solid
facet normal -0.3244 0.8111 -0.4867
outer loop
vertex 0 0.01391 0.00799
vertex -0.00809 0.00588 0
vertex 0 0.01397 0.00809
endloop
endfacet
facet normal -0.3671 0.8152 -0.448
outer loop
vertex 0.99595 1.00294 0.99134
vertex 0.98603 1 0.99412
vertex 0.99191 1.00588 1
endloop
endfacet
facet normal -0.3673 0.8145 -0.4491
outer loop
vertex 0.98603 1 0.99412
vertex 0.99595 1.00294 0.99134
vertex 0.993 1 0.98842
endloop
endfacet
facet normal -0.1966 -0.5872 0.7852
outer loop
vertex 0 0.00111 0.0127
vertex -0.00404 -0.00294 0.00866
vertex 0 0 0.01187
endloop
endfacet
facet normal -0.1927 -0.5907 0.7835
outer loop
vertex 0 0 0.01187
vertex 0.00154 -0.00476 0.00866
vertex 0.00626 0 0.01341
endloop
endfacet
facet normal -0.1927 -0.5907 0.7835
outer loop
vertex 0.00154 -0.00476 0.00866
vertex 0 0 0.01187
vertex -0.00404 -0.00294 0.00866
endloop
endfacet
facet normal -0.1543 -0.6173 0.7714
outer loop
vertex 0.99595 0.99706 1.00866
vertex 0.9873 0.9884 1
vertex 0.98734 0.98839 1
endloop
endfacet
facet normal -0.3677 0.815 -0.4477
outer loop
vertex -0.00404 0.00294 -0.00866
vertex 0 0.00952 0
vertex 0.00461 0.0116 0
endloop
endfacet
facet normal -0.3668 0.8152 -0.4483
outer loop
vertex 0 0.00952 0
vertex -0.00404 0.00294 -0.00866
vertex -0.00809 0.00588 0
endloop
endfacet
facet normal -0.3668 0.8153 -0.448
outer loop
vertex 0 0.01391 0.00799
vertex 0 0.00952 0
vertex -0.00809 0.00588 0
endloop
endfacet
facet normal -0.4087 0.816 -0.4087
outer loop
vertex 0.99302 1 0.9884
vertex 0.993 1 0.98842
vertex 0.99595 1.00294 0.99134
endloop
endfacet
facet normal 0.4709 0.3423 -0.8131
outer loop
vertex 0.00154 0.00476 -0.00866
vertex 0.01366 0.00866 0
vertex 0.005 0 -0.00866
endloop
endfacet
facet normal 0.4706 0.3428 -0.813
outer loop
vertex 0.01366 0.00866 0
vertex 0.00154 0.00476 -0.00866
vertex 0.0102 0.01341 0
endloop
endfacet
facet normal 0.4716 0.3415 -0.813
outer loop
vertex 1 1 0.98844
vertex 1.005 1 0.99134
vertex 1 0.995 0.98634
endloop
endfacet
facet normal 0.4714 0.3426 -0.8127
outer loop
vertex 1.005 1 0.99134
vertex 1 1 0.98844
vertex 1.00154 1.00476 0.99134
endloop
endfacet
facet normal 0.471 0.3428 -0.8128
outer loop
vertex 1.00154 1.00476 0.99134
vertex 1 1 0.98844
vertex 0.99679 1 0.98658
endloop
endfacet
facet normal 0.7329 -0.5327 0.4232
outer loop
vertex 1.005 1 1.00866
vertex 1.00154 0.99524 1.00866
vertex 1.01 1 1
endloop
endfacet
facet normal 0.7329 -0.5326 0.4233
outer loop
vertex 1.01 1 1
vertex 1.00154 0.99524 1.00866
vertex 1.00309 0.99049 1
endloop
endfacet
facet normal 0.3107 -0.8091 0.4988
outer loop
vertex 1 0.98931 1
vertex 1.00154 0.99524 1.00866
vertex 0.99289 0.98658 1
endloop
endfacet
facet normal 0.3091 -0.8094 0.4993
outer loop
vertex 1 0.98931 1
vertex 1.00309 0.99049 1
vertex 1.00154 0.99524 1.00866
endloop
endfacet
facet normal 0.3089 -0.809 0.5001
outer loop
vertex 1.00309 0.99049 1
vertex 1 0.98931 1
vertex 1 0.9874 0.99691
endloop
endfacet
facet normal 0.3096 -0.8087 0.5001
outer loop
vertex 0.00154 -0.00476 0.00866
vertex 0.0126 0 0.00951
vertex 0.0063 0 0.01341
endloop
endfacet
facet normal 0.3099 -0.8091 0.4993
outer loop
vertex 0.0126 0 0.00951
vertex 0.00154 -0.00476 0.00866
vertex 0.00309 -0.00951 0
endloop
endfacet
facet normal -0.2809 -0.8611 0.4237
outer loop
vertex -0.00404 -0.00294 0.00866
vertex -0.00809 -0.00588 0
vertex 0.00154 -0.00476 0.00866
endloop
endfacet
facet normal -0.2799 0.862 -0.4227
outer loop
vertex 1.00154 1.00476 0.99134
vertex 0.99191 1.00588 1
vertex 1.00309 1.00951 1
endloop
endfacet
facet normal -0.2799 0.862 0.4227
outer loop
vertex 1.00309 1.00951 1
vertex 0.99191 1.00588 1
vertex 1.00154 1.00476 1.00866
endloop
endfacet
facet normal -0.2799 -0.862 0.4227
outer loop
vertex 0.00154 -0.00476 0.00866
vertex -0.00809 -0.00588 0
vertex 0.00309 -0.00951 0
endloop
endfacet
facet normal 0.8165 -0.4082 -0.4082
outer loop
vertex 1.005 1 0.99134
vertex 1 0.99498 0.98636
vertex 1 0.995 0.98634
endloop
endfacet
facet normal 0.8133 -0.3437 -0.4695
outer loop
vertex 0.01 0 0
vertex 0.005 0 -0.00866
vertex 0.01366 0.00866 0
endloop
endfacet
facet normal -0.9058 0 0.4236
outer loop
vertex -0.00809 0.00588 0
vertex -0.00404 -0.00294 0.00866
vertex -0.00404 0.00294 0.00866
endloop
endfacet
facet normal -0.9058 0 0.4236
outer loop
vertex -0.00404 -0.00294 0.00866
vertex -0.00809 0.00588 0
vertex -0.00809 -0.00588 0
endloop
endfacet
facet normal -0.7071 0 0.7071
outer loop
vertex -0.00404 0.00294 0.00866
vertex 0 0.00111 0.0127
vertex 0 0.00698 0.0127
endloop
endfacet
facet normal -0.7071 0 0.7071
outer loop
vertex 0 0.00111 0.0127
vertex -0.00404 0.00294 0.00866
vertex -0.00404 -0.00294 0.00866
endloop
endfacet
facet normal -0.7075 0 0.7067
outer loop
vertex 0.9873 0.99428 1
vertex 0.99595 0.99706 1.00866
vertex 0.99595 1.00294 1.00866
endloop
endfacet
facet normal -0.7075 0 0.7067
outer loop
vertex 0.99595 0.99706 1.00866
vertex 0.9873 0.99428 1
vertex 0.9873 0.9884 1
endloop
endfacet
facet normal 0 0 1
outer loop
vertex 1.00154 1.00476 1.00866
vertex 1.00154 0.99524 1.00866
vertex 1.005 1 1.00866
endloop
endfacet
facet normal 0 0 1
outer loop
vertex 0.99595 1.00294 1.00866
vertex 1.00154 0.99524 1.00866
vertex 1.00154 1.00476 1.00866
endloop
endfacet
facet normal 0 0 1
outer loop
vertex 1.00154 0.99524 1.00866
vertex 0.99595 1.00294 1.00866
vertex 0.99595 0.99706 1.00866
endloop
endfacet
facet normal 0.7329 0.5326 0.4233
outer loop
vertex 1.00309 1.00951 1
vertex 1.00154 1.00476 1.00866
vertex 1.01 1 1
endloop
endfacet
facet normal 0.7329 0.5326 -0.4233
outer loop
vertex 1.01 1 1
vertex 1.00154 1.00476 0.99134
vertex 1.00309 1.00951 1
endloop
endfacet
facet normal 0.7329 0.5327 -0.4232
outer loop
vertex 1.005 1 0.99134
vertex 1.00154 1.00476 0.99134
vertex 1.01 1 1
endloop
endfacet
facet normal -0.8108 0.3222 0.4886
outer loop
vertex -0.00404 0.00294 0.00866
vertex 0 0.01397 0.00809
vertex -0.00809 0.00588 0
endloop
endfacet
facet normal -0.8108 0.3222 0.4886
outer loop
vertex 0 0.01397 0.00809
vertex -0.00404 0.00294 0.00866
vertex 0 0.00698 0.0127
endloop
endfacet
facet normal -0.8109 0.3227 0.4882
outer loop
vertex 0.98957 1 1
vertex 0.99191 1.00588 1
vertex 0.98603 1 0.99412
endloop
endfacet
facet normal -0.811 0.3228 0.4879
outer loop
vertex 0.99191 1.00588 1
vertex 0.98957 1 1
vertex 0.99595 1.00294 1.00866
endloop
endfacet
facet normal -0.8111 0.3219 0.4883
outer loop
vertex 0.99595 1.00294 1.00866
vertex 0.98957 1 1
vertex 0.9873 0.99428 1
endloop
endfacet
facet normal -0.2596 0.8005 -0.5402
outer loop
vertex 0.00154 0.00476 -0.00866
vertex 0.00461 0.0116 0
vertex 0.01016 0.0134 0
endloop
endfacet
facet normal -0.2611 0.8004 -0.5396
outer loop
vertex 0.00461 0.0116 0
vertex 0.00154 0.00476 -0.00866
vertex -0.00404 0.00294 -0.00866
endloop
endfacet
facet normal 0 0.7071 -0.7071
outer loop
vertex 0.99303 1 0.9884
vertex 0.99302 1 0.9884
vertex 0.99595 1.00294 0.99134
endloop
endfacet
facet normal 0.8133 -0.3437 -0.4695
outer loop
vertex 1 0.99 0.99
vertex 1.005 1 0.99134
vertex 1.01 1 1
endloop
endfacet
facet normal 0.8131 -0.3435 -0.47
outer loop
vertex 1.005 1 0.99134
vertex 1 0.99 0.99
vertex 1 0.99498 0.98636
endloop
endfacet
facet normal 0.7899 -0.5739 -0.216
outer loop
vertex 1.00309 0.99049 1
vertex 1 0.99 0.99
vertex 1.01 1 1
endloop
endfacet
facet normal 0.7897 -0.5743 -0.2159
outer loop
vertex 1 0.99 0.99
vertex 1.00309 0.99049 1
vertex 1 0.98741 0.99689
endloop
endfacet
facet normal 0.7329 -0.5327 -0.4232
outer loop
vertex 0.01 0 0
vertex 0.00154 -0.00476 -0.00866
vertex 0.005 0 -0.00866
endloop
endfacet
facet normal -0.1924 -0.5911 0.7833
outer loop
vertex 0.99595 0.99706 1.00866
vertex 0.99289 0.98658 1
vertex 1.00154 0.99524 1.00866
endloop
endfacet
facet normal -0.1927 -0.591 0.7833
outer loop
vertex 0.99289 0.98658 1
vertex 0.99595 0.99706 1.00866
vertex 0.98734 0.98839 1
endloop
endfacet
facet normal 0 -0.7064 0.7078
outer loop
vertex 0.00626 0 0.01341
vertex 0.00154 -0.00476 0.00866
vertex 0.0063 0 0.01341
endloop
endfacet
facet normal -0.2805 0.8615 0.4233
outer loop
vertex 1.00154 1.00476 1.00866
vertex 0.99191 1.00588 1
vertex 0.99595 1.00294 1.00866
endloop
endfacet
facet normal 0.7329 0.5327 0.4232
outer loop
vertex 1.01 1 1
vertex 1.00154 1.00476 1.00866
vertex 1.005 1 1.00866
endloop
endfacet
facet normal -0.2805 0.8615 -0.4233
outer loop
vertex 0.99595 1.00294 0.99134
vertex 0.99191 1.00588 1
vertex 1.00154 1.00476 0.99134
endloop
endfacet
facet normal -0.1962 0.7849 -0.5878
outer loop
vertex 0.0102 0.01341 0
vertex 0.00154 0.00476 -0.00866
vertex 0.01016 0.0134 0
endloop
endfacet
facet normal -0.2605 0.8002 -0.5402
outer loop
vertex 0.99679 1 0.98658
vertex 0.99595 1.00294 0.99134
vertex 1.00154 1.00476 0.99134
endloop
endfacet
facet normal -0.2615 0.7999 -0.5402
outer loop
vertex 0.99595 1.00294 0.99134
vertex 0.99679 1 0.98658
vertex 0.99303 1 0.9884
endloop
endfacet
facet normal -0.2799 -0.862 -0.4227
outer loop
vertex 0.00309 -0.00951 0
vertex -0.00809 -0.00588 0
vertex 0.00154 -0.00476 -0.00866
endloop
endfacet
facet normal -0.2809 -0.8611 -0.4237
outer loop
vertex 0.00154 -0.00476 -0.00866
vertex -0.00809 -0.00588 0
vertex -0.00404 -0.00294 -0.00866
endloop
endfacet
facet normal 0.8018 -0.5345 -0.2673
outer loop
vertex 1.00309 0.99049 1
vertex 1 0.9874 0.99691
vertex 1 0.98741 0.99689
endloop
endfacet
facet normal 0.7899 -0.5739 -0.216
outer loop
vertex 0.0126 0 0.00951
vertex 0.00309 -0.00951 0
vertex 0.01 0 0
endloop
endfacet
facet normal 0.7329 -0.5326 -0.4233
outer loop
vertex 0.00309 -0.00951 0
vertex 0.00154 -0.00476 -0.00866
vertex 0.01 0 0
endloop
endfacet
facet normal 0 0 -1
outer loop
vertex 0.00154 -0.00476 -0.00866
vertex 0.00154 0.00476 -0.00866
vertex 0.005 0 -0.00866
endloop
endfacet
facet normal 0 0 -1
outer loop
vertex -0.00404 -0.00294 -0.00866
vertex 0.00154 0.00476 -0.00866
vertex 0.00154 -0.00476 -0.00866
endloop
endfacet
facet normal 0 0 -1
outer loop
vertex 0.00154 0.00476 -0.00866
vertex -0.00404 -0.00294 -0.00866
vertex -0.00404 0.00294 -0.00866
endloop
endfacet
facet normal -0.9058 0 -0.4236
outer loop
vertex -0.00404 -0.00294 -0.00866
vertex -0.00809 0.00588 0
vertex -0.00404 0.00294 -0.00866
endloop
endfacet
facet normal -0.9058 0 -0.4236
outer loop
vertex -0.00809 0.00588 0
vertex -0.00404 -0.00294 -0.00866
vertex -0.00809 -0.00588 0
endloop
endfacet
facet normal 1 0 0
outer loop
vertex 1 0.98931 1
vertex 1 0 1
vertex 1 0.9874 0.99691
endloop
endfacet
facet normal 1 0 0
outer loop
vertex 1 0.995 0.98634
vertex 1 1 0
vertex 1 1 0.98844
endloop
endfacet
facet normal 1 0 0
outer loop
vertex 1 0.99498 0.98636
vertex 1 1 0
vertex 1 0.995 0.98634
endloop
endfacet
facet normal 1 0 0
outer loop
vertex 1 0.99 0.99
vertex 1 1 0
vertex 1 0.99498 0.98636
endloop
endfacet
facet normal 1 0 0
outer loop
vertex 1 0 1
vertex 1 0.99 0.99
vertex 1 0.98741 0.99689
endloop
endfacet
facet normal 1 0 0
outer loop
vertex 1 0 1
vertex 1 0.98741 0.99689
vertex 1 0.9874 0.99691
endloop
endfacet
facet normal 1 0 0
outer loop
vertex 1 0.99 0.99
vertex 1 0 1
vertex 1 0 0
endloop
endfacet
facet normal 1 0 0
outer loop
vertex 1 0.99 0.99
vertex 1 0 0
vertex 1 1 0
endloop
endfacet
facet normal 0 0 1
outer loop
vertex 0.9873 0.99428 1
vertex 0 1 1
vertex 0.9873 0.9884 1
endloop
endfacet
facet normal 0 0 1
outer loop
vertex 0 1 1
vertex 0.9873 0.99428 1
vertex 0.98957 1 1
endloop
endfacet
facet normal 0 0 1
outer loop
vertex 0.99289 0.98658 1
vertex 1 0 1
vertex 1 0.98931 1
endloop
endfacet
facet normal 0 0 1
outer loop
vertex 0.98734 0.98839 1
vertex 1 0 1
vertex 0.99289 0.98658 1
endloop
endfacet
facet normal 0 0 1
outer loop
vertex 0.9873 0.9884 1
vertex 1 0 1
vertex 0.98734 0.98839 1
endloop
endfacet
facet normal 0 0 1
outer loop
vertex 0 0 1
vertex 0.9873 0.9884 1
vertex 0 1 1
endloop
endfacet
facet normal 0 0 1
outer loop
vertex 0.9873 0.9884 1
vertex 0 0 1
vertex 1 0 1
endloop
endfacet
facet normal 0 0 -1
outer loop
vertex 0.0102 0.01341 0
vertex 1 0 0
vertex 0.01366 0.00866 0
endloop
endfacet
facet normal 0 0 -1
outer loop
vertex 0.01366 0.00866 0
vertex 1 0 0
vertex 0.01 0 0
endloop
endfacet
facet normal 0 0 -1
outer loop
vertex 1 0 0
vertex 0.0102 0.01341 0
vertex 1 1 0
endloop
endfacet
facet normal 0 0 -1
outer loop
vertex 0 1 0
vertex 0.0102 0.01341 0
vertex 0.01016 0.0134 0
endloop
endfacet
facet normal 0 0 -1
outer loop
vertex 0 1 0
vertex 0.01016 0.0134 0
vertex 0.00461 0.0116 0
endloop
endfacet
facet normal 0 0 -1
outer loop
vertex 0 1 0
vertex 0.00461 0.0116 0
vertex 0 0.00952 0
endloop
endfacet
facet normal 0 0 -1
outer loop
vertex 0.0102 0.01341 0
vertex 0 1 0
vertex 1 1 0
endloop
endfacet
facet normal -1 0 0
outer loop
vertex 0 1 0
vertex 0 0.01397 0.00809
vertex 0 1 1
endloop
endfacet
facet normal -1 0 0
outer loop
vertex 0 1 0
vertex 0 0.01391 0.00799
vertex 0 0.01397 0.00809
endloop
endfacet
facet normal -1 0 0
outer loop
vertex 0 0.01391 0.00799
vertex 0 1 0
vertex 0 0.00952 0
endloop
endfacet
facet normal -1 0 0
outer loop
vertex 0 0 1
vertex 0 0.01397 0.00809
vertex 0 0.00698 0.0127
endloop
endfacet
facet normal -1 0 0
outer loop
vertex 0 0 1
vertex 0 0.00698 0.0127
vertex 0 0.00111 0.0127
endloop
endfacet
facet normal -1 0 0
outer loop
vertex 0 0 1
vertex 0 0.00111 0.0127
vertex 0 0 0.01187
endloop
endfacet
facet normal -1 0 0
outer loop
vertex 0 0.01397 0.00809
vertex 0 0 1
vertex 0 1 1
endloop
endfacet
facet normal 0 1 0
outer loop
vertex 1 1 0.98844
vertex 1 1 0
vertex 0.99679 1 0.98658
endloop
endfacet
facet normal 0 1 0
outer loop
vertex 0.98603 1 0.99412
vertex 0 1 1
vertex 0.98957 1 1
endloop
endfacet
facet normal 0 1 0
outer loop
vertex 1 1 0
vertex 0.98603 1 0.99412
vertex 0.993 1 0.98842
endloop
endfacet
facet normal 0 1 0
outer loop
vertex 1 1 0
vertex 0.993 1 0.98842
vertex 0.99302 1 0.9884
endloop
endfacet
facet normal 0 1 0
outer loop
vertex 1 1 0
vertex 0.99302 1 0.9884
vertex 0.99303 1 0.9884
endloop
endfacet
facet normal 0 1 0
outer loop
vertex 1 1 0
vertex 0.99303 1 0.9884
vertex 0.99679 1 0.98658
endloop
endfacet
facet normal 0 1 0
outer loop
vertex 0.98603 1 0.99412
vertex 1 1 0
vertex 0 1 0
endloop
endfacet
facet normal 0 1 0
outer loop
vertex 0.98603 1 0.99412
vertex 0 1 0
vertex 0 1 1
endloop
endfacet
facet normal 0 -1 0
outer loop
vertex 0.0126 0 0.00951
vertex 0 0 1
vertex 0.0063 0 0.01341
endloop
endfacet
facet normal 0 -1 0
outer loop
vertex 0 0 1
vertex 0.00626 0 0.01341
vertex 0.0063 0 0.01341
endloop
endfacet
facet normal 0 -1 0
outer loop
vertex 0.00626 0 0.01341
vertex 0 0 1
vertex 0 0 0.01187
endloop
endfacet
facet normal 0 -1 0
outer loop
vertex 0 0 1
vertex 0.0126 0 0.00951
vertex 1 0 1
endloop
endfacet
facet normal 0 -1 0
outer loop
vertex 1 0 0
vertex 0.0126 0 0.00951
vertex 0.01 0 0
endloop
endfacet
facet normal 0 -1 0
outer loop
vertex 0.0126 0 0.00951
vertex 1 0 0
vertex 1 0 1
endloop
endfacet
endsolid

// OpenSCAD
hull()
{translate([0,0,0])sphere(0.01);translate([1,1,1])sphere(0.01);
}
 #cube(1);
//#sphere(1,$fn=25);

//#linear_extrude(1)polygon([[0,0],[1,0],[0,1]]);
//linear_extrude(1)polygon([[0,0],[1,0],[0,1]])
AP=[0.75,0.25,0.5]  ;
BP= [0.5,0.75,0.25] ;
CP= [0.75,0.5,0.25]  ;
DP= [0.5,0.25,0.75] ;
EP= [0.25,0.75,0.5]  ;
FP= [0.25,0.5,0.75]  ;


A000= AP +[0,0,0]; 
B000= BP +[0,0,0];
C000= CP+[0,0,0];
D000= DP+[0,0,0];
E000= EP+[0,0,0];
F000= FP +[0,0,0];

A100= AP +[1,0,0]; 
B100= BP +[1,0,0];
C100= CP+[1,0,0];
D100= DP+[1,0,0];
E100= EP+[1,0,0];
F100= FP +[1,0,0];

A110= AP +[1,1,0]; 
B110= BP +[1,1,0];
C110= CP+[1,1,0];
D110= DP+[1,1,0];
E110= EP+[1,1,0];
F110= FP +[1,1,0];

A010= AP +[0,1,0]; 
B010= BP +[0,1,0];
C010= CP+[0,1,0];
D010= DP+[0,1,0];
E010= EP+[0,1,0];
F010= FP +[0,1,0];


A001= AP +[0,0,1]; 
B001= BP +[0,0,1];
C001= CP+[0,0,1];
D001= DP+[0,0,1];
E001= EP+[0,0,1];
F001= FP +[0,0,1];

A101= AP +[1,0,1]; 
B101= BP +[1,0,1];
C101= CP+[1,0,1];
D101= DP+[1,0,1];
E101= EP+[1,0,1];
F101= FP +[1,0,1];

A111= AP +[1,1,1]; 
B111= BP +[1,1,1];
C111= CP+[1,1,1];
D111= DP+[1,1,1];
E111= EP+[1,1,1];
F111= FP +[1,1,1];

A011= AP +[0,1,1]; 
B011= BP +[0,1,1];
C011= CP+[0,1,1];
D011= DP+[0,1,1];
E011= EP+[0,1,1];
F011= FP +[0,1,1];


* c();
 

 //for(x=[-2:2],y=[-2:2],z=[-2:2])
 x=0;y=0;z=0;
translate([x,y,z-0.1])full(,x,y,z);
 
module full(x,y,z){p=[x,y,z];
e000=eval([x,y,z]+[0,0,0]);
e100=eval([x,y,z]+[1,0,0]);
e010=eval([x,y,z]+[0,1,0]);
e011=eval([x,y,z]+[0,1,1]);
e001=eval([x,y,z]+[0,0,1]);
e110=eval([x,y,z]+[1,1,0]);
e101=eval([x,y,z]+[1,0,1]);
e111=eval([x,y,z]+[1,1,1]);

//tet(e000,e100,e111);
polyhedron ([p+[0,0,0],p+[1,0,0],p+[1,1,1]],[[0,1,2]]);
//if (e101!=e111)polyh6(F100,A000,D000,C001,E101,B101,e101);
//if (e110!=e111)polyh6(E100,D110,F110,A010,B000,C000,e110);
//if (e011!=e111)polyh6(B001,F000,E000,D010,C011,A011,e001);
//
//if (e100!=e111)color("red")polyh(F100,E100,C000,A000,e100);
//if (e010!=e111)color("red") polyh(B000,E000,D010,A010,e010);
//if (e001!=e111)color("red") polyh(B001,C001,D000,F000 ,e001);
//if (e000!=e111)polyh6(A000,C000,B000,E000,F000,D000,e000);

}

function eval(p)=
sign(sphere(p, 1.5));


 function sphere(p, b = 1) = norm(p) - b;


module c(){
translate(AP) linear_extrude(0.1,center=true)text("A",0.1,$fn=29);
 translate(BP) linear_extrude(0.1,center=true)text("B",0.1,$fn=29);
 translate([0.75,0.5,0.25])linear_extrude(0.1,center=true)text("C",0.1,$fn=29);

translate([0.5,0.25,0.75])linear_extrude(0.1,center=true)text("D",0.1,$fn=29);
 translate([0.25,0.75,0.5]) linear_extrude(0.1,center=true)text("E",0.1,$fn=29);
 translate(FP) linear_extrude(0.1,center=true)text("F",0.1,$fn=29);
}

module polyh(p0,p1,p2,p3,flip)
{
if(flip==-1){polyhedron([p0,p1,p2,p3],[[0,1,2],[0,2,3]]);}
else{ polyhedron([p0,p1,p2,p3],[[2,1,0],[3,2,0]]);}
}
//module polyh5(p0,p1,p2,p3,p4,flip)
//{
//if(flip){polyhedron([p0,p1,p2,p3,p4],[[0,1,2],[0,2,3],[0,3,4]]);}
//else  {polyhedron([p0,p1,p2,p3,p4],[[2,1,0],[3,2,0],[4,3,0]]);}
//}
module polyh6(p0,p1,p2,p3,p4,p5,flip)
{
if(flip){
color("blue") polyhedron([p0,p1,p2,p3,p4,p5],[[0,1,2],[0,2,3]]);
color("darkblue") polyhedron([p0,p1,p2,p3,p4,p5],[[0,3,4],[0,4,5]]);
}else{
color("blue") polyhedron([p0,p1,p2,p3,p4,p5],[[2,1,0],[3,2,0]]);
color("darkblue") polyhedron([p0,p1,p2,p3,p4,p5],[[4,3,0],[5,4,0]]);
}
}
